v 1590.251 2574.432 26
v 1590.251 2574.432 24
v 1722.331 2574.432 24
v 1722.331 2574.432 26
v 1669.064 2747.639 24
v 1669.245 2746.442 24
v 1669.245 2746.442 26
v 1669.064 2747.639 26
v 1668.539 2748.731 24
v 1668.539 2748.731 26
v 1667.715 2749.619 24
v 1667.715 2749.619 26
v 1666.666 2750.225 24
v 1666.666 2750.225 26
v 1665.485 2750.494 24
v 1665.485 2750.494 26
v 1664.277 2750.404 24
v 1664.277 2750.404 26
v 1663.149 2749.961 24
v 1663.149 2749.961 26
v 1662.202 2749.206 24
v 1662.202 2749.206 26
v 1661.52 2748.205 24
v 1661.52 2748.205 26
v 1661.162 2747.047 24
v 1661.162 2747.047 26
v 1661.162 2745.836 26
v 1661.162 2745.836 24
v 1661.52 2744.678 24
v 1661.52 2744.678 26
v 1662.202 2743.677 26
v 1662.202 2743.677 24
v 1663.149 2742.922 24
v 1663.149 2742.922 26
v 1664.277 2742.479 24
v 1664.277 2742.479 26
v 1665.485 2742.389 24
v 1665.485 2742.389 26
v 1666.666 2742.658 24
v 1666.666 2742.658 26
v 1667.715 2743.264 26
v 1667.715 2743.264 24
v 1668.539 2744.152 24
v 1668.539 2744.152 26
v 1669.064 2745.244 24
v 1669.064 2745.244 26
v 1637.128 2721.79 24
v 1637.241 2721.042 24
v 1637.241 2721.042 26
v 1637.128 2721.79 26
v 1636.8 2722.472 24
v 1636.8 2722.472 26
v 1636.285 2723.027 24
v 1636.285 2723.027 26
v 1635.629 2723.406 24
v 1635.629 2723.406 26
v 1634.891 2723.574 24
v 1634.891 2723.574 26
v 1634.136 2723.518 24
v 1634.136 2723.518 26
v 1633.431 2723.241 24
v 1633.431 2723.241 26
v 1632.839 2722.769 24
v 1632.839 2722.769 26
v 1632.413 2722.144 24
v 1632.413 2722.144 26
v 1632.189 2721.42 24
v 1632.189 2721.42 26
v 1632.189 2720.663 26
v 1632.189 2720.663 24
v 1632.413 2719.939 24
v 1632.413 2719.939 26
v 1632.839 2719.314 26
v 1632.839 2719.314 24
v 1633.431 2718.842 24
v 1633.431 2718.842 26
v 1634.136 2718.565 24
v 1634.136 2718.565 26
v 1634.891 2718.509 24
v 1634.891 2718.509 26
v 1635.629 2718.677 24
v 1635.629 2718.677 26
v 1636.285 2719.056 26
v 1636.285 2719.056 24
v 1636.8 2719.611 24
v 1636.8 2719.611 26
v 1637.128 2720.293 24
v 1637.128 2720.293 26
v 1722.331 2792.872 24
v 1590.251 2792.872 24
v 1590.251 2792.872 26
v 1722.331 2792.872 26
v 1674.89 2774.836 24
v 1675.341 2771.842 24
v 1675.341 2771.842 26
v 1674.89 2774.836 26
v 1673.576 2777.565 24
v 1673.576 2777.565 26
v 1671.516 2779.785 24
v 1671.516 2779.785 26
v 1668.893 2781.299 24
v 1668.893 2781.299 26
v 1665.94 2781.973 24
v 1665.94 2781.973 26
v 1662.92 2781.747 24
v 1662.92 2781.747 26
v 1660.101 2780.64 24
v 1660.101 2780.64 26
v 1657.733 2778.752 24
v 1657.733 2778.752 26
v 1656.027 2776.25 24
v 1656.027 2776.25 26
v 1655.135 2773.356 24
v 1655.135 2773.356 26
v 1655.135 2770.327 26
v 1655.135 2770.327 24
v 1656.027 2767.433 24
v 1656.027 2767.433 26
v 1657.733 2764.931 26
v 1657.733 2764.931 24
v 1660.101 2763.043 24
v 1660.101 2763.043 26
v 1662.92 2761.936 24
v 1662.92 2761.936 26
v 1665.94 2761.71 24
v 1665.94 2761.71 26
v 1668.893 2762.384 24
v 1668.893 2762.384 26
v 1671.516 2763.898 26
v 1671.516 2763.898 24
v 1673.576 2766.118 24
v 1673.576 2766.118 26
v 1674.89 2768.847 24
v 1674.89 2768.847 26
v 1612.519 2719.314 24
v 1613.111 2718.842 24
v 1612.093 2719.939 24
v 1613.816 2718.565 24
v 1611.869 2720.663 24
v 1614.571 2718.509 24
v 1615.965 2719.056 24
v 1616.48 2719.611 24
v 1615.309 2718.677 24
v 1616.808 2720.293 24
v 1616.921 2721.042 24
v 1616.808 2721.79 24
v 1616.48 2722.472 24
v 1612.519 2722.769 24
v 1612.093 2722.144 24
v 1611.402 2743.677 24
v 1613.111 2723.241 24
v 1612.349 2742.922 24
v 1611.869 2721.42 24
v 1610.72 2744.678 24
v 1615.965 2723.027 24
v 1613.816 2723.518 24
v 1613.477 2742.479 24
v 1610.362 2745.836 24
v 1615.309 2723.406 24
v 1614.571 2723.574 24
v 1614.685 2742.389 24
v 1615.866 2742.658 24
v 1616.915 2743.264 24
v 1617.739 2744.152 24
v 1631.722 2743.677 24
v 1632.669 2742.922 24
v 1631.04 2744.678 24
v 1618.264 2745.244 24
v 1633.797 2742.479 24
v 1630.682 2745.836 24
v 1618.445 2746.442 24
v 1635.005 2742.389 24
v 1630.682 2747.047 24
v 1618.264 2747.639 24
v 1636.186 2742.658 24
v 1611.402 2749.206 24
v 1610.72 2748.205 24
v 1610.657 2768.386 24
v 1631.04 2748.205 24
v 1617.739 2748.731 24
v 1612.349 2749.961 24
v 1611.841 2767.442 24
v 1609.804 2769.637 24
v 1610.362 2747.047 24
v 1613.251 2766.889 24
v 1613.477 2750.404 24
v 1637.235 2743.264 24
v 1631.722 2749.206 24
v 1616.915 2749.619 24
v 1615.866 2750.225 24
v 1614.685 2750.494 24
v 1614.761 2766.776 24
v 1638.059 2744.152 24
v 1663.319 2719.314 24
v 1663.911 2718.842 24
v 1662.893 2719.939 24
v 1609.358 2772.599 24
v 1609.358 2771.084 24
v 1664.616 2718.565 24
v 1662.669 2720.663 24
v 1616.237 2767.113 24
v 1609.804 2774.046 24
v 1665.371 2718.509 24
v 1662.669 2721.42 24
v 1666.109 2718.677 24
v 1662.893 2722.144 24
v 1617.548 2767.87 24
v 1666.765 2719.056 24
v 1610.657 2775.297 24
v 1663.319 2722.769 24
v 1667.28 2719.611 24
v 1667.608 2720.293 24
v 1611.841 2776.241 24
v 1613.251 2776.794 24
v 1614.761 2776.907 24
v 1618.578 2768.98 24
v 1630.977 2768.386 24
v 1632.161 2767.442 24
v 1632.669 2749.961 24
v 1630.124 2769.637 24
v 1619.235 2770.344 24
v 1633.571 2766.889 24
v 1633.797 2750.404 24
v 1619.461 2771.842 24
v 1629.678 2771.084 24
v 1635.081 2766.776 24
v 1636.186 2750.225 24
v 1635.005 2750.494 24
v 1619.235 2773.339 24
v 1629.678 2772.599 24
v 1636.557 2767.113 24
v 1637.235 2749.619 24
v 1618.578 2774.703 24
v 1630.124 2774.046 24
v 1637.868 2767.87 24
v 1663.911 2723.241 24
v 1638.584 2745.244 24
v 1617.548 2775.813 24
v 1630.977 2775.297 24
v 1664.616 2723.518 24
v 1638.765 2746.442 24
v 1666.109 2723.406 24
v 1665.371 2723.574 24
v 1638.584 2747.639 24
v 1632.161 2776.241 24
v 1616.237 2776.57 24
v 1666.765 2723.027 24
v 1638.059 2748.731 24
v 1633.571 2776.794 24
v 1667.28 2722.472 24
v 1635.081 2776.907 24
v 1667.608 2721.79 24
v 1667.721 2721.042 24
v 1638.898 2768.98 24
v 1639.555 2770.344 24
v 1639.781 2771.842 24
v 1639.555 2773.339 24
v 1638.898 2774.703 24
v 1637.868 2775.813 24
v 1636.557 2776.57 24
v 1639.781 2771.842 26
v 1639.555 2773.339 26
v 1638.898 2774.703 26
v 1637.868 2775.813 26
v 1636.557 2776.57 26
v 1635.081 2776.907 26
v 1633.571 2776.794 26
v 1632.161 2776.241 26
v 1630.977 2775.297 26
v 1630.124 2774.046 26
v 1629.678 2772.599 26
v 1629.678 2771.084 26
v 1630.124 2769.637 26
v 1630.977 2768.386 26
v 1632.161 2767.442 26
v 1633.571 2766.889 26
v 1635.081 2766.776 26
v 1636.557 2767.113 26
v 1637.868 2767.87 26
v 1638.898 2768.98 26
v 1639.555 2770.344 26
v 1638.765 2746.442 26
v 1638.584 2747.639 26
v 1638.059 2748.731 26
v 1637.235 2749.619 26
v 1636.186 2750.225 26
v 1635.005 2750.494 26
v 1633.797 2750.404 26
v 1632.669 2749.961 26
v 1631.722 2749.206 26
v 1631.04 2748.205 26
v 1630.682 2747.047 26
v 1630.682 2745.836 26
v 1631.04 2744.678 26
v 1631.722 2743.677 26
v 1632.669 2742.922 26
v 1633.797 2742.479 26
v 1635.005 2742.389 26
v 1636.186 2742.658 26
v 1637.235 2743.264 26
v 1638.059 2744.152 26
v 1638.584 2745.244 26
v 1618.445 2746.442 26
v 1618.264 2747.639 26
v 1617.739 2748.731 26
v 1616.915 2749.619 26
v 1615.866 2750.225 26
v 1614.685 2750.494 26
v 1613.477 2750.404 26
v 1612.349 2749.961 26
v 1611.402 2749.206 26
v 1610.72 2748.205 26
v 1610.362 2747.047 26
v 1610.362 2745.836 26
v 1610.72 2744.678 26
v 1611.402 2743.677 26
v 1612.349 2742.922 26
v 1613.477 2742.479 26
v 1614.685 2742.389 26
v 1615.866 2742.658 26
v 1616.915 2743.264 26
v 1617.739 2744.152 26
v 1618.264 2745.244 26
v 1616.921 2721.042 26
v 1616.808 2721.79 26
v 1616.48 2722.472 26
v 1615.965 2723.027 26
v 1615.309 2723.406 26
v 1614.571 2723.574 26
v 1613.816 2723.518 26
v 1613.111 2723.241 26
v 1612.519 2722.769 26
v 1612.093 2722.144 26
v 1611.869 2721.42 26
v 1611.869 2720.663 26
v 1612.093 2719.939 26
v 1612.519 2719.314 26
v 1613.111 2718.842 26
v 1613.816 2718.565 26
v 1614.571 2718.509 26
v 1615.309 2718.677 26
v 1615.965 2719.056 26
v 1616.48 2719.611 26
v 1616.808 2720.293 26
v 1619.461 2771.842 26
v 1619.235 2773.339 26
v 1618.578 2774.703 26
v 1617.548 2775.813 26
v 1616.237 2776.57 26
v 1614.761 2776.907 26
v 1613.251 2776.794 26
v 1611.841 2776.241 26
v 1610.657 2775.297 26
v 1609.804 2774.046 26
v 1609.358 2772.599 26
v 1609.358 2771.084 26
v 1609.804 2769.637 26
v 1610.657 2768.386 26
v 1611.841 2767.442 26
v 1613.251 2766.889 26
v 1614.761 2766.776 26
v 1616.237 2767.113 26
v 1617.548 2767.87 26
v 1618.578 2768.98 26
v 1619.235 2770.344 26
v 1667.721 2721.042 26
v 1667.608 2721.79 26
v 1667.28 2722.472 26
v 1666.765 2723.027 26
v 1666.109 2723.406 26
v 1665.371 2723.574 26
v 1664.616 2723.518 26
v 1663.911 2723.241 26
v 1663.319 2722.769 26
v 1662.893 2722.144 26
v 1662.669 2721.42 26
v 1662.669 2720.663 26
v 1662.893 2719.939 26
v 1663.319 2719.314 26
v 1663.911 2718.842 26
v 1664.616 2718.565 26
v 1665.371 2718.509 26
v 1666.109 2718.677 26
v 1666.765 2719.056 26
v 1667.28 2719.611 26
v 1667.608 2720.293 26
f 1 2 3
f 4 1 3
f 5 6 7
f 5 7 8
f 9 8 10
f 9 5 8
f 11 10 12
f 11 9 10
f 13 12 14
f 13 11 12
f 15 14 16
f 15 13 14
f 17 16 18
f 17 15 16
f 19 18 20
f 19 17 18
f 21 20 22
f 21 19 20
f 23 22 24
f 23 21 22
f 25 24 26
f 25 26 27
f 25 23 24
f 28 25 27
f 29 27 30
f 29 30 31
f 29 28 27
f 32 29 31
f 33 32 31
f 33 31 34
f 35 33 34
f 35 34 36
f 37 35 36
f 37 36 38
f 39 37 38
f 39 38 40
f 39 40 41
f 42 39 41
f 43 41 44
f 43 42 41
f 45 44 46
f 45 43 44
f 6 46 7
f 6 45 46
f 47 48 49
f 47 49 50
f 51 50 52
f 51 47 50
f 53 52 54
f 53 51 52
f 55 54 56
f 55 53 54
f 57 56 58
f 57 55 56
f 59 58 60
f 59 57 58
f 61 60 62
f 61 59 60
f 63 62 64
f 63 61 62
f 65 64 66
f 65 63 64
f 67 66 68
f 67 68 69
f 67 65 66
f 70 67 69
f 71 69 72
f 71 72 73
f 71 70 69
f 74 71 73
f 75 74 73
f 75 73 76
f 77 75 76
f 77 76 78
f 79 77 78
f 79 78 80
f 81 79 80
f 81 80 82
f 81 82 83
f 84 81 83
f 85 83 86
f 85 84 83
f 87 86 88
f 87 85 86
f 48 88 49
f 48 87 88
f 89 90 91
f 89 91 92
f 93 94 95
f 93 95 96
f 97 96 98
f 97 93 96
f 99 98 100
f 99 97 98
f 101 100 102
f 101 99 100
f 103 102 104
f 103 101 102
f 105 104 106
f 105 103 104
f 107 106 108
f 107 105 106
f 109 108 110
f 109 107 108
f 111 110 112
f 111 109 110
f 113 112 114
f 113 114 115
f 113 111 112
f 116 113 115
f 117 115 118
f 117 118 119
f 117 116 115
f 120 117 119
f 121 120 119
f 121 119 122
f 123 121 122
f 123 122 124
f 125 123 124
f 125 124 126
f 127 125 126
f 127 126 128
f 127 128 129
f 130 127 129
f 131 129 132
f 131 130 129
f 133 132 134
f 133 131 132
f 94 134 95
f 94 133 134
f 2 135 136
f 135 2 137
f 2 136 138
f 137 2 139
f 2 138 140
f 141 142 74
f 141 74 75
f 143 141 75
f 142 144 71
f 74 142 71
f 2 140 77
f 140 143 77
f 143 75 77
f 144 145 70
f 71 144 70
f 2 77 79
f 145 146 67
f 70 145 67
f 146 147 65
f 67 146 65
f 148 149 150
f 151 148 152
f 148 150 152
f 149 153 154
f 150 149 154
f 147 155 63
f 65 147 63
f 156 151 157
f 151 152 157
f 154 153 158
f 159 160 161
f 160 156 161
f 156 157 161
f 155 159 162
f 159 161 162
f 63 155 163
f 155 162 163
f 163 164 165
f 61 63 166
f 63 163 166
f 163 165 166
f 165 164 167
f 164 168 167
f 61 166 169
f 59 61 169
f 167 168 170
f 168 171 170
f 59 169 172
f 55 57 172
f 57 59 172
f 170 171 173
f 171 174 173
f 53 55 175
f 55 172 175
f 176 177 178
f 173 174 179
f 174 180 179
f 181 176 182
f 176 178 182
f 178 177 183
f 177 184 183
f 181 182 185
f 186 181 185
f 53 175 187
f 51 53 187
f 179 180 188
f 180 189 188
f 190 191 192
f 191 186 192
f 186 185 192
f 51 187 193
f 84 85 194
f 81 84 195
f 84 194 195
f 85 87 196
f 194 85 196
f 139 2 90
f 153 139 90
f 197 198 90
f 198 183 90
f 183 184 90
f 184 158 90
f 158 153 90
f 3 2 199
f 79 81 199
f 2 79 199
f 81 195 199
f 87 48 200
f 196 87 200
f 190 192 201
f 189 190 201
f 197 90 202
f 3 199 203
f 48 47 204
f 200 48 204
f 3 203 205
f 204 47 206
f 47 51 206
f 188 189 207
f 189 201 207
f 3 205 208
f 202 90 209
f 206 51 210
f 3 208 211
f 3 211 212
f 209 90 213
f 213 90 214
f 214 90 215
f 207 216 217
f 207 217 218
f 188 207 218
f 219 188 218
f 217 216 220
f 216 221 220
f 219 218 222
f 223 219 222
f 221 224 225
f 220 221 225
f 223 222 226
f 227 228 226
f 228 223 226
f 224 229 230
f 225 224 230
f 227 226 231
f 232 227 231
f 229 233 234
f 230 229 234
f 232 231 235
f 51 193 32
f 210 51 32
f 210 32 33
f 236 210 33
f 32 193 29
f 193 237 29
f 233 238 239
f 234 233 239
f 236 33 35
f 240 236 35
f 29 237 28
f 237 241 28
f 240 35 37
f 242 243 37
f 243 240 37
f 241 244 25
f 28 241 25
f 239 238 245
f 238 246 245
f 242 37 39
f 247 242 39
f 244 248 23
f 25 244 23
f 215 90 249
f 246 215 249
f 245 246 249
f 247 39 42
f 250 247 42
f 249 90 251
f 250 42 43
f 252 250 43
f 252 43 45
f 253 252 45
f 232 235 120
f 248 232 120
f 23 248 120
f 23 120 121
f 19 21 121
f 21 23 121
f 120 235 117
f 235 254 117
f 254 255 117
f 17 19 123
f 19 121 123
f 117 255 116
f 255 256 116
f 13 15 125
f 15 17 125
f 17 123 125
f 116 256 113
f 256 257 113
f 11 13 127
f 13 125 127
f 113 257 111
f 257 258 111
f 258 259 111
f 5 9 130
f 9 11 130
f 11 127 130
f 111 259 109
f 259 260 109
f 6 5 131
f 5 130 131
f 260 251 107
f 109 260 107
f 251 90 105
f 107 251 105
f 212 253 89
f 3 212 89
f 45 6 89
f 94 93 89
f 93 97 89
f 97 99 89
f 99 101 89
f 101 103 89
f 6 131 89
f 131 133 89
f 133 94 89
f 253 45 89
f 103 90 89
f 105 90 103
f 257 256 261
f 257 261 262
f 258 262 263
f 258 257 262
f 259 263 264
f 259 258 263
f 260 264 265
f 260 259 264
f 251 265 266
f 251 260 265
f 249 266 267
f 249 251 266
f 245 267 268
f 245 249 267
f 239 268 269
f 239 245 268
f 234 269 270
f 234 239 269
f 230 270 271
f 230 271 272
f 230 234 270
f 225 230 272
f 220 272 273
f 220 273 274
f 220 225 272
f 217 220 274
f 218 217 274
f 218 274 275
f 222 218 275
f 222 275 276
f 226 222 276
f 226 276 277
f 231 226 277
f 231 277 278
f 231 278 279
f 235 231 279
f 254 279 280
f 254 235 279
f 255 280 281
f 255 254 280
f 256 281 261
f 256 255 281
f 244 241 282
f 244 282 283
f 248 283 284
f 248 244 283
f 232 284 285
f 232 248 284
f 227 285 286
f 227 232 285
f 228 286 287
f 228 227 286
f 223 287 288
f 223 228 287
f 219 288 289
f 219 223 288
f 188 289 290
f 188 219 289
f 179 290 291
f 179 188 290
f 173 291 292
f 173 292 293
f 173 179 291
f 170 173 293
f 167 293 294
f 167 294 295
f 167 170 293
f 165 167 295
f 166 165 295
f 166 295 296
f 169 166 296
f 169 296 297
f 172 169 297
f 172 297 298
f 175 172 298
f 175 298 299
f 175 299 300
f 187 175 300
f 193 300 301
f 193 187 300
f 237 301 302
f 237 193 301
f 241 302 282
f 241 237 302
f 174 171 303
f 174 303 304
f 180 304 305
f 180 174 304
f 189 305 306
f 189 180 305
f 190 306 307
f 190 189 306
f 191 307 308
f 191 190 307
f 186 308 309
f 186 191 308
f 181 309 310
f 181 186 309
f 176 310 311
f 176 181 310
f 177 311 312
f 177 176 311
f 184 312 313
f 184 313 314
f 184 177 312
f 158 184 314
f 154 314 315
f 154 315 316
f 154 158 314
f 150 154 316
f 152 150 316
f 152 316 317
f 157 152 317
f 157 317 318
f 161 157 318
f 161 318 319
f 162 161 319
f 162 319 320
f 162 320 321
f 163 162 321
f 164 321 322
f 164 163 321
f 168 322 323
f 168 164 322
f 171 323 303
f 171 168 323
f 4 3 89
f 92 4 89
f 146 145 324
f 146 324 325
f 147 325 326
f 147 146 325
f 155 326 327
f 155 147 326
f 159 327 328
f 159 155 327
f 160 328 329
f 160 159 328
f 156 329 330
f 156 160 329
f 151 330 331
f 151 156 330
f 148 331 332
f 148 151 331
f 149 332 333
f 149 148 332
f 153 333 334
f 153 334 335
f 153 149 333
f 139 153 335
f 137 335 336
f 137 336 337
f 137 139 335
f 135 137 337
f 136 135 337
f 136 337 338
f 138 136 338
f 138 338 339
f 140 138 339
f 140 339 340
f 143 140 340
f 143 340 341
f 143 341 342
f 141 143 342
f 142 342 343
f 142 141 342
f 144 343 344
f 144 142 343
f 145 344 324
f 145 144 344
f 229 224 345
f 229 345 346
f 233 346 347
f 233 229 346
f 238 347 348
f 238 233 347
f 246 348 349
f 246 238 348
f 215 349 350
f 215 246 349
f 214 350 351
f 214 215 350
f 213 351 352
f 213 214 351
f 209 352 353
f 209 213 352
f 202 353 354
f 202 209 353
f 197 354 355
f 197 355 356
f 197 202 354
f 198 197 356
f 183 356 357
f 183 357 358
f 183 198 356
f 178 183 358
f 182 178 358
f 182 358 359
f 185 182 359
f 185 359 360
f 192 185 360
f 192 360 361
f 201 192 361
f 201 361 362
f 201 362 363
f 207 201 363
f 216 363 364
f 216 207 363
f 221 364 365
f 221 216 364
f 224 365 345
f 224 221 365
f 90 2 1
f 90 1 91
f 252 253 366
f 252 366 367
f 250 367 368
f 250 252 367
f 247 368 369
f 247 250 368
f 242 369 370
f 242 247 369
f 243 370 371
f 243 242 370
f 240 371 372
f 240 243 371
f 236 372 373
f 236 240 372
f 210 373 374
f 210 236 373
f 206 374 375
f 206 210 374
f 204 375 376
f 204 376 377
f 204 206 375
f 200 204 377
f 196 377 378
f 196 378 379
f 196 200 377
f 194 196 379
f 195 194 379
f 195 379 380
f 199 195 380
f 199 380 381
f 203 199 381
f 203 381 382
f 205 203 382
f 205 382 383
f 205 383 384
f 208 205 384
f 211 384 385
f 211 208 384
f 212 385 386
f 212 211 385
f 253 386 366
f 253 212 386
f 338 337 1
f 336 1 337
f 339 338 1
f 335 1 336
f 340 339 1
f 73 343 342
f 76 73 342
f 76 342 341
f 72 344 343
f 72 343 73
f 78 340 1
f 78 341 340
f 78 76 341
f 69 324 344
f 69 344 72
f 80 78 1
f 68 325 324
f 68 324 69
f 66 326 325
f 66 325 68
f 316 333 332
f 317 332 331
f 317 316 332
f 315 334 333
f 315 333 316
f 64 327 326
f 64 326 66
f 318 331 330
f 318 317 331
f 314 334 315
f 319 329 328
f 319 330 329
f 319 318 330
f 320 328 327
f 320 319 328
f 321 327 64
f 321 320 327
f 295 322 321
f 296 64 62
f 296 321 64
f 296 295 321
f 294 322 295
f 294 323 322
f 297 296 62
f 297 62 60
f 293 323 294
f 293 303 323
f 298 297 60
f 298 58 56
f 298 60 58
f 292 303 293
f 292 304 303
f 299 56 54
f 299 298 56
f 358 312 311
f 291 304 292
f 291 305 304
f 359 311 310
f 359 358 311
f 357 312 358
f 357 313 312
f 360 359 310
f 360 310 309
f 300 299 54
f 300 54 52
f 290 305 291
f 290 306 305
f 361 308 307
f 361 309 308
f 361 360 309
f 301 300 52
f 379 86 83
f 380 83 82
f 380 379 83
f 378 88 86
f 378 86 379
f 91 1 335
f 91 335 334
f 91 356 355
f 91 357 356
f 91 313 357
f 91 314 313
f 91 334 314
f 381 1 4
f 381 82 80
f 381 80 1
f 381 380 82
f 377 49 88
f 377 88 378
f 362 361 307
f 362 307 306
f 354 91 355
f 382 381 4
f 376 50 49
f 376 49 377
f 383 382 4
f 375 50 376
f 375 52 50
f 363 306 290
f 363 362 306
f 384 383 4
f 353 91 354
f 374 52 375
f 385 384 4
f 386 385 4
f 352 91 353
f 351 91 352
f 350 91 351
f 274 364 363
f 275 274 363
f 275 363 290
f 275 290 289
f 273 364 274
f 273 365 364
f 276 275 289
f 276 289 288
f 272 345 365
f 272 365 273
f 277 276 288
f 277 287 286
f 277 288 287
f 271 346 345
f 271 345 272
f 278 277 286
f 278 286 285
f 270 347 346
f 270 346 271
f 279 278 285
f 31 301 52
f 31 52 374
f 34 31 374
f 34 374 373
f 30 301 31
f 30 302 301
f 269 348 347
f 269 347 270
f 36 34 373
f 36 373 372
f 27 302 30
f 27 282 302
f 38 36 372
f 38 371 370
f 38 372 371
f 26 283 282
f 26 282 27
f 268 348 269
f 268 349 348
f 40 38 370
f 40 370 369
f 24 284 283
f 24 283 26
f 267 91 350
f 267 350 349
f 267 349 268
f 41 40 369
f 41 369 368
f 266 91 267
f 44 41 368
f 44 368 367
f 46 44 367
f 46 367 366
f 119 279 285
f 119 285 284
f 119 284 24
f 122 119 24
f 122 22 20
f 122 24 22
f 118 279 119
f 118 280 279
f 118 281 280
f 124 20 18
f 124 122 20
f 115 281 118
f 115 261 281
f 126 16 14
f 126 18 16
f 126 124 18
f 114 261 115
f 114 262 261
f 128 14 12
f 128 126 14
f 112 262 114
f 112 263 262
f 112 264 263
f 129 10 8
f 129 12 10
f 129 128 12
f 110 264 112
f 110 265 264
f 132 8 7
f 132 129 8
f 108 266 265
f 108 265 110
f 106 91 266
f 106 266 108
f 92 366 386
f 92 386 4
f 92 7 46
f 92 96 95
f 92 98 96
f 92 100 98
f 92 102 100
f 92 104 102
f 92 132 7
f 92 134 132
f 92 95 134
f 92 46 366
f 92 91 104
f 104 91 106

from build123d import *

# Parameters (mm, degrees)
SKETCH1_W           = 3302
SKETCH1_H           = 5461
SKETCH1_R           = 254
SKETCH1_R_2         = 127
SKETCH1_R_3         = 101.6
SKETCH1_R_4         = 63.5
BOSS_EXTRUDE1_DEPTH = 50
SCALE1_SCALE        = 0.04


with BuildPart() as part:
    # Sketch1 → Boss-Extrude1 (new body)
    with BuildSketch(Plane.XY):
        with Locations((1651, 2730.5)):
            Rectangle(SKETCH1_W, SKETCH1_H)
        with Locations((1873.2539878, 4935.236460216)):
            Circle(SKETCH1_R, mode=Mode.SUBTRACT)
        with Locations((603.2539878, 4935.236460216)):
            Circle(SKETCH1_R_2, mode=Mode.SUBTRACT)
        with Locations((603.2539878, 4300.236460216)):
            Circle(SKETCH1_R_3, mode=Mode.SUBTRACT)
        with Locations((603.2539878, 3665.236460216)):
            Circle(SKETCH1_R_4, mode=Mode.SUBTRACT)
        with Locations((1111.2539878, 4935.236460216)):
            Circle(SKETCH1_R_2, mode=Mode.SUBTRACT)
        with Locations((1111.2539878, 4300.236460216)):
            Circle(SKETCH1_R_3, mode=Mode.SUBTRACT)
        with Locations((1111.2539878, 3665.236460216)):
            Circle(SKETCH1_R_4, mode=Mode.SUBTRACT)
        with Locations((1873.2539878, 4300.236460216)):
            Circle(SKETCH1_R_3, mode=Mode.SUBTRACT)
        with Locations((1873.2539878, 3665.236460216)):
            Circle(SKETCH1_R_4, mode=Mode.SUBTRACT)
    extrude(amount=BOSS_EXTRUDE1_DEPTH)


with BuildPart() as part_1:
    # Scale1: scaled about (1656.511334765, 2681.700048918, 25)
    add(part.part.scale(SCALE1_SCALE).moved(Location((1590.250881374, 2574.432046961, 24))))


solid = part_1.part
